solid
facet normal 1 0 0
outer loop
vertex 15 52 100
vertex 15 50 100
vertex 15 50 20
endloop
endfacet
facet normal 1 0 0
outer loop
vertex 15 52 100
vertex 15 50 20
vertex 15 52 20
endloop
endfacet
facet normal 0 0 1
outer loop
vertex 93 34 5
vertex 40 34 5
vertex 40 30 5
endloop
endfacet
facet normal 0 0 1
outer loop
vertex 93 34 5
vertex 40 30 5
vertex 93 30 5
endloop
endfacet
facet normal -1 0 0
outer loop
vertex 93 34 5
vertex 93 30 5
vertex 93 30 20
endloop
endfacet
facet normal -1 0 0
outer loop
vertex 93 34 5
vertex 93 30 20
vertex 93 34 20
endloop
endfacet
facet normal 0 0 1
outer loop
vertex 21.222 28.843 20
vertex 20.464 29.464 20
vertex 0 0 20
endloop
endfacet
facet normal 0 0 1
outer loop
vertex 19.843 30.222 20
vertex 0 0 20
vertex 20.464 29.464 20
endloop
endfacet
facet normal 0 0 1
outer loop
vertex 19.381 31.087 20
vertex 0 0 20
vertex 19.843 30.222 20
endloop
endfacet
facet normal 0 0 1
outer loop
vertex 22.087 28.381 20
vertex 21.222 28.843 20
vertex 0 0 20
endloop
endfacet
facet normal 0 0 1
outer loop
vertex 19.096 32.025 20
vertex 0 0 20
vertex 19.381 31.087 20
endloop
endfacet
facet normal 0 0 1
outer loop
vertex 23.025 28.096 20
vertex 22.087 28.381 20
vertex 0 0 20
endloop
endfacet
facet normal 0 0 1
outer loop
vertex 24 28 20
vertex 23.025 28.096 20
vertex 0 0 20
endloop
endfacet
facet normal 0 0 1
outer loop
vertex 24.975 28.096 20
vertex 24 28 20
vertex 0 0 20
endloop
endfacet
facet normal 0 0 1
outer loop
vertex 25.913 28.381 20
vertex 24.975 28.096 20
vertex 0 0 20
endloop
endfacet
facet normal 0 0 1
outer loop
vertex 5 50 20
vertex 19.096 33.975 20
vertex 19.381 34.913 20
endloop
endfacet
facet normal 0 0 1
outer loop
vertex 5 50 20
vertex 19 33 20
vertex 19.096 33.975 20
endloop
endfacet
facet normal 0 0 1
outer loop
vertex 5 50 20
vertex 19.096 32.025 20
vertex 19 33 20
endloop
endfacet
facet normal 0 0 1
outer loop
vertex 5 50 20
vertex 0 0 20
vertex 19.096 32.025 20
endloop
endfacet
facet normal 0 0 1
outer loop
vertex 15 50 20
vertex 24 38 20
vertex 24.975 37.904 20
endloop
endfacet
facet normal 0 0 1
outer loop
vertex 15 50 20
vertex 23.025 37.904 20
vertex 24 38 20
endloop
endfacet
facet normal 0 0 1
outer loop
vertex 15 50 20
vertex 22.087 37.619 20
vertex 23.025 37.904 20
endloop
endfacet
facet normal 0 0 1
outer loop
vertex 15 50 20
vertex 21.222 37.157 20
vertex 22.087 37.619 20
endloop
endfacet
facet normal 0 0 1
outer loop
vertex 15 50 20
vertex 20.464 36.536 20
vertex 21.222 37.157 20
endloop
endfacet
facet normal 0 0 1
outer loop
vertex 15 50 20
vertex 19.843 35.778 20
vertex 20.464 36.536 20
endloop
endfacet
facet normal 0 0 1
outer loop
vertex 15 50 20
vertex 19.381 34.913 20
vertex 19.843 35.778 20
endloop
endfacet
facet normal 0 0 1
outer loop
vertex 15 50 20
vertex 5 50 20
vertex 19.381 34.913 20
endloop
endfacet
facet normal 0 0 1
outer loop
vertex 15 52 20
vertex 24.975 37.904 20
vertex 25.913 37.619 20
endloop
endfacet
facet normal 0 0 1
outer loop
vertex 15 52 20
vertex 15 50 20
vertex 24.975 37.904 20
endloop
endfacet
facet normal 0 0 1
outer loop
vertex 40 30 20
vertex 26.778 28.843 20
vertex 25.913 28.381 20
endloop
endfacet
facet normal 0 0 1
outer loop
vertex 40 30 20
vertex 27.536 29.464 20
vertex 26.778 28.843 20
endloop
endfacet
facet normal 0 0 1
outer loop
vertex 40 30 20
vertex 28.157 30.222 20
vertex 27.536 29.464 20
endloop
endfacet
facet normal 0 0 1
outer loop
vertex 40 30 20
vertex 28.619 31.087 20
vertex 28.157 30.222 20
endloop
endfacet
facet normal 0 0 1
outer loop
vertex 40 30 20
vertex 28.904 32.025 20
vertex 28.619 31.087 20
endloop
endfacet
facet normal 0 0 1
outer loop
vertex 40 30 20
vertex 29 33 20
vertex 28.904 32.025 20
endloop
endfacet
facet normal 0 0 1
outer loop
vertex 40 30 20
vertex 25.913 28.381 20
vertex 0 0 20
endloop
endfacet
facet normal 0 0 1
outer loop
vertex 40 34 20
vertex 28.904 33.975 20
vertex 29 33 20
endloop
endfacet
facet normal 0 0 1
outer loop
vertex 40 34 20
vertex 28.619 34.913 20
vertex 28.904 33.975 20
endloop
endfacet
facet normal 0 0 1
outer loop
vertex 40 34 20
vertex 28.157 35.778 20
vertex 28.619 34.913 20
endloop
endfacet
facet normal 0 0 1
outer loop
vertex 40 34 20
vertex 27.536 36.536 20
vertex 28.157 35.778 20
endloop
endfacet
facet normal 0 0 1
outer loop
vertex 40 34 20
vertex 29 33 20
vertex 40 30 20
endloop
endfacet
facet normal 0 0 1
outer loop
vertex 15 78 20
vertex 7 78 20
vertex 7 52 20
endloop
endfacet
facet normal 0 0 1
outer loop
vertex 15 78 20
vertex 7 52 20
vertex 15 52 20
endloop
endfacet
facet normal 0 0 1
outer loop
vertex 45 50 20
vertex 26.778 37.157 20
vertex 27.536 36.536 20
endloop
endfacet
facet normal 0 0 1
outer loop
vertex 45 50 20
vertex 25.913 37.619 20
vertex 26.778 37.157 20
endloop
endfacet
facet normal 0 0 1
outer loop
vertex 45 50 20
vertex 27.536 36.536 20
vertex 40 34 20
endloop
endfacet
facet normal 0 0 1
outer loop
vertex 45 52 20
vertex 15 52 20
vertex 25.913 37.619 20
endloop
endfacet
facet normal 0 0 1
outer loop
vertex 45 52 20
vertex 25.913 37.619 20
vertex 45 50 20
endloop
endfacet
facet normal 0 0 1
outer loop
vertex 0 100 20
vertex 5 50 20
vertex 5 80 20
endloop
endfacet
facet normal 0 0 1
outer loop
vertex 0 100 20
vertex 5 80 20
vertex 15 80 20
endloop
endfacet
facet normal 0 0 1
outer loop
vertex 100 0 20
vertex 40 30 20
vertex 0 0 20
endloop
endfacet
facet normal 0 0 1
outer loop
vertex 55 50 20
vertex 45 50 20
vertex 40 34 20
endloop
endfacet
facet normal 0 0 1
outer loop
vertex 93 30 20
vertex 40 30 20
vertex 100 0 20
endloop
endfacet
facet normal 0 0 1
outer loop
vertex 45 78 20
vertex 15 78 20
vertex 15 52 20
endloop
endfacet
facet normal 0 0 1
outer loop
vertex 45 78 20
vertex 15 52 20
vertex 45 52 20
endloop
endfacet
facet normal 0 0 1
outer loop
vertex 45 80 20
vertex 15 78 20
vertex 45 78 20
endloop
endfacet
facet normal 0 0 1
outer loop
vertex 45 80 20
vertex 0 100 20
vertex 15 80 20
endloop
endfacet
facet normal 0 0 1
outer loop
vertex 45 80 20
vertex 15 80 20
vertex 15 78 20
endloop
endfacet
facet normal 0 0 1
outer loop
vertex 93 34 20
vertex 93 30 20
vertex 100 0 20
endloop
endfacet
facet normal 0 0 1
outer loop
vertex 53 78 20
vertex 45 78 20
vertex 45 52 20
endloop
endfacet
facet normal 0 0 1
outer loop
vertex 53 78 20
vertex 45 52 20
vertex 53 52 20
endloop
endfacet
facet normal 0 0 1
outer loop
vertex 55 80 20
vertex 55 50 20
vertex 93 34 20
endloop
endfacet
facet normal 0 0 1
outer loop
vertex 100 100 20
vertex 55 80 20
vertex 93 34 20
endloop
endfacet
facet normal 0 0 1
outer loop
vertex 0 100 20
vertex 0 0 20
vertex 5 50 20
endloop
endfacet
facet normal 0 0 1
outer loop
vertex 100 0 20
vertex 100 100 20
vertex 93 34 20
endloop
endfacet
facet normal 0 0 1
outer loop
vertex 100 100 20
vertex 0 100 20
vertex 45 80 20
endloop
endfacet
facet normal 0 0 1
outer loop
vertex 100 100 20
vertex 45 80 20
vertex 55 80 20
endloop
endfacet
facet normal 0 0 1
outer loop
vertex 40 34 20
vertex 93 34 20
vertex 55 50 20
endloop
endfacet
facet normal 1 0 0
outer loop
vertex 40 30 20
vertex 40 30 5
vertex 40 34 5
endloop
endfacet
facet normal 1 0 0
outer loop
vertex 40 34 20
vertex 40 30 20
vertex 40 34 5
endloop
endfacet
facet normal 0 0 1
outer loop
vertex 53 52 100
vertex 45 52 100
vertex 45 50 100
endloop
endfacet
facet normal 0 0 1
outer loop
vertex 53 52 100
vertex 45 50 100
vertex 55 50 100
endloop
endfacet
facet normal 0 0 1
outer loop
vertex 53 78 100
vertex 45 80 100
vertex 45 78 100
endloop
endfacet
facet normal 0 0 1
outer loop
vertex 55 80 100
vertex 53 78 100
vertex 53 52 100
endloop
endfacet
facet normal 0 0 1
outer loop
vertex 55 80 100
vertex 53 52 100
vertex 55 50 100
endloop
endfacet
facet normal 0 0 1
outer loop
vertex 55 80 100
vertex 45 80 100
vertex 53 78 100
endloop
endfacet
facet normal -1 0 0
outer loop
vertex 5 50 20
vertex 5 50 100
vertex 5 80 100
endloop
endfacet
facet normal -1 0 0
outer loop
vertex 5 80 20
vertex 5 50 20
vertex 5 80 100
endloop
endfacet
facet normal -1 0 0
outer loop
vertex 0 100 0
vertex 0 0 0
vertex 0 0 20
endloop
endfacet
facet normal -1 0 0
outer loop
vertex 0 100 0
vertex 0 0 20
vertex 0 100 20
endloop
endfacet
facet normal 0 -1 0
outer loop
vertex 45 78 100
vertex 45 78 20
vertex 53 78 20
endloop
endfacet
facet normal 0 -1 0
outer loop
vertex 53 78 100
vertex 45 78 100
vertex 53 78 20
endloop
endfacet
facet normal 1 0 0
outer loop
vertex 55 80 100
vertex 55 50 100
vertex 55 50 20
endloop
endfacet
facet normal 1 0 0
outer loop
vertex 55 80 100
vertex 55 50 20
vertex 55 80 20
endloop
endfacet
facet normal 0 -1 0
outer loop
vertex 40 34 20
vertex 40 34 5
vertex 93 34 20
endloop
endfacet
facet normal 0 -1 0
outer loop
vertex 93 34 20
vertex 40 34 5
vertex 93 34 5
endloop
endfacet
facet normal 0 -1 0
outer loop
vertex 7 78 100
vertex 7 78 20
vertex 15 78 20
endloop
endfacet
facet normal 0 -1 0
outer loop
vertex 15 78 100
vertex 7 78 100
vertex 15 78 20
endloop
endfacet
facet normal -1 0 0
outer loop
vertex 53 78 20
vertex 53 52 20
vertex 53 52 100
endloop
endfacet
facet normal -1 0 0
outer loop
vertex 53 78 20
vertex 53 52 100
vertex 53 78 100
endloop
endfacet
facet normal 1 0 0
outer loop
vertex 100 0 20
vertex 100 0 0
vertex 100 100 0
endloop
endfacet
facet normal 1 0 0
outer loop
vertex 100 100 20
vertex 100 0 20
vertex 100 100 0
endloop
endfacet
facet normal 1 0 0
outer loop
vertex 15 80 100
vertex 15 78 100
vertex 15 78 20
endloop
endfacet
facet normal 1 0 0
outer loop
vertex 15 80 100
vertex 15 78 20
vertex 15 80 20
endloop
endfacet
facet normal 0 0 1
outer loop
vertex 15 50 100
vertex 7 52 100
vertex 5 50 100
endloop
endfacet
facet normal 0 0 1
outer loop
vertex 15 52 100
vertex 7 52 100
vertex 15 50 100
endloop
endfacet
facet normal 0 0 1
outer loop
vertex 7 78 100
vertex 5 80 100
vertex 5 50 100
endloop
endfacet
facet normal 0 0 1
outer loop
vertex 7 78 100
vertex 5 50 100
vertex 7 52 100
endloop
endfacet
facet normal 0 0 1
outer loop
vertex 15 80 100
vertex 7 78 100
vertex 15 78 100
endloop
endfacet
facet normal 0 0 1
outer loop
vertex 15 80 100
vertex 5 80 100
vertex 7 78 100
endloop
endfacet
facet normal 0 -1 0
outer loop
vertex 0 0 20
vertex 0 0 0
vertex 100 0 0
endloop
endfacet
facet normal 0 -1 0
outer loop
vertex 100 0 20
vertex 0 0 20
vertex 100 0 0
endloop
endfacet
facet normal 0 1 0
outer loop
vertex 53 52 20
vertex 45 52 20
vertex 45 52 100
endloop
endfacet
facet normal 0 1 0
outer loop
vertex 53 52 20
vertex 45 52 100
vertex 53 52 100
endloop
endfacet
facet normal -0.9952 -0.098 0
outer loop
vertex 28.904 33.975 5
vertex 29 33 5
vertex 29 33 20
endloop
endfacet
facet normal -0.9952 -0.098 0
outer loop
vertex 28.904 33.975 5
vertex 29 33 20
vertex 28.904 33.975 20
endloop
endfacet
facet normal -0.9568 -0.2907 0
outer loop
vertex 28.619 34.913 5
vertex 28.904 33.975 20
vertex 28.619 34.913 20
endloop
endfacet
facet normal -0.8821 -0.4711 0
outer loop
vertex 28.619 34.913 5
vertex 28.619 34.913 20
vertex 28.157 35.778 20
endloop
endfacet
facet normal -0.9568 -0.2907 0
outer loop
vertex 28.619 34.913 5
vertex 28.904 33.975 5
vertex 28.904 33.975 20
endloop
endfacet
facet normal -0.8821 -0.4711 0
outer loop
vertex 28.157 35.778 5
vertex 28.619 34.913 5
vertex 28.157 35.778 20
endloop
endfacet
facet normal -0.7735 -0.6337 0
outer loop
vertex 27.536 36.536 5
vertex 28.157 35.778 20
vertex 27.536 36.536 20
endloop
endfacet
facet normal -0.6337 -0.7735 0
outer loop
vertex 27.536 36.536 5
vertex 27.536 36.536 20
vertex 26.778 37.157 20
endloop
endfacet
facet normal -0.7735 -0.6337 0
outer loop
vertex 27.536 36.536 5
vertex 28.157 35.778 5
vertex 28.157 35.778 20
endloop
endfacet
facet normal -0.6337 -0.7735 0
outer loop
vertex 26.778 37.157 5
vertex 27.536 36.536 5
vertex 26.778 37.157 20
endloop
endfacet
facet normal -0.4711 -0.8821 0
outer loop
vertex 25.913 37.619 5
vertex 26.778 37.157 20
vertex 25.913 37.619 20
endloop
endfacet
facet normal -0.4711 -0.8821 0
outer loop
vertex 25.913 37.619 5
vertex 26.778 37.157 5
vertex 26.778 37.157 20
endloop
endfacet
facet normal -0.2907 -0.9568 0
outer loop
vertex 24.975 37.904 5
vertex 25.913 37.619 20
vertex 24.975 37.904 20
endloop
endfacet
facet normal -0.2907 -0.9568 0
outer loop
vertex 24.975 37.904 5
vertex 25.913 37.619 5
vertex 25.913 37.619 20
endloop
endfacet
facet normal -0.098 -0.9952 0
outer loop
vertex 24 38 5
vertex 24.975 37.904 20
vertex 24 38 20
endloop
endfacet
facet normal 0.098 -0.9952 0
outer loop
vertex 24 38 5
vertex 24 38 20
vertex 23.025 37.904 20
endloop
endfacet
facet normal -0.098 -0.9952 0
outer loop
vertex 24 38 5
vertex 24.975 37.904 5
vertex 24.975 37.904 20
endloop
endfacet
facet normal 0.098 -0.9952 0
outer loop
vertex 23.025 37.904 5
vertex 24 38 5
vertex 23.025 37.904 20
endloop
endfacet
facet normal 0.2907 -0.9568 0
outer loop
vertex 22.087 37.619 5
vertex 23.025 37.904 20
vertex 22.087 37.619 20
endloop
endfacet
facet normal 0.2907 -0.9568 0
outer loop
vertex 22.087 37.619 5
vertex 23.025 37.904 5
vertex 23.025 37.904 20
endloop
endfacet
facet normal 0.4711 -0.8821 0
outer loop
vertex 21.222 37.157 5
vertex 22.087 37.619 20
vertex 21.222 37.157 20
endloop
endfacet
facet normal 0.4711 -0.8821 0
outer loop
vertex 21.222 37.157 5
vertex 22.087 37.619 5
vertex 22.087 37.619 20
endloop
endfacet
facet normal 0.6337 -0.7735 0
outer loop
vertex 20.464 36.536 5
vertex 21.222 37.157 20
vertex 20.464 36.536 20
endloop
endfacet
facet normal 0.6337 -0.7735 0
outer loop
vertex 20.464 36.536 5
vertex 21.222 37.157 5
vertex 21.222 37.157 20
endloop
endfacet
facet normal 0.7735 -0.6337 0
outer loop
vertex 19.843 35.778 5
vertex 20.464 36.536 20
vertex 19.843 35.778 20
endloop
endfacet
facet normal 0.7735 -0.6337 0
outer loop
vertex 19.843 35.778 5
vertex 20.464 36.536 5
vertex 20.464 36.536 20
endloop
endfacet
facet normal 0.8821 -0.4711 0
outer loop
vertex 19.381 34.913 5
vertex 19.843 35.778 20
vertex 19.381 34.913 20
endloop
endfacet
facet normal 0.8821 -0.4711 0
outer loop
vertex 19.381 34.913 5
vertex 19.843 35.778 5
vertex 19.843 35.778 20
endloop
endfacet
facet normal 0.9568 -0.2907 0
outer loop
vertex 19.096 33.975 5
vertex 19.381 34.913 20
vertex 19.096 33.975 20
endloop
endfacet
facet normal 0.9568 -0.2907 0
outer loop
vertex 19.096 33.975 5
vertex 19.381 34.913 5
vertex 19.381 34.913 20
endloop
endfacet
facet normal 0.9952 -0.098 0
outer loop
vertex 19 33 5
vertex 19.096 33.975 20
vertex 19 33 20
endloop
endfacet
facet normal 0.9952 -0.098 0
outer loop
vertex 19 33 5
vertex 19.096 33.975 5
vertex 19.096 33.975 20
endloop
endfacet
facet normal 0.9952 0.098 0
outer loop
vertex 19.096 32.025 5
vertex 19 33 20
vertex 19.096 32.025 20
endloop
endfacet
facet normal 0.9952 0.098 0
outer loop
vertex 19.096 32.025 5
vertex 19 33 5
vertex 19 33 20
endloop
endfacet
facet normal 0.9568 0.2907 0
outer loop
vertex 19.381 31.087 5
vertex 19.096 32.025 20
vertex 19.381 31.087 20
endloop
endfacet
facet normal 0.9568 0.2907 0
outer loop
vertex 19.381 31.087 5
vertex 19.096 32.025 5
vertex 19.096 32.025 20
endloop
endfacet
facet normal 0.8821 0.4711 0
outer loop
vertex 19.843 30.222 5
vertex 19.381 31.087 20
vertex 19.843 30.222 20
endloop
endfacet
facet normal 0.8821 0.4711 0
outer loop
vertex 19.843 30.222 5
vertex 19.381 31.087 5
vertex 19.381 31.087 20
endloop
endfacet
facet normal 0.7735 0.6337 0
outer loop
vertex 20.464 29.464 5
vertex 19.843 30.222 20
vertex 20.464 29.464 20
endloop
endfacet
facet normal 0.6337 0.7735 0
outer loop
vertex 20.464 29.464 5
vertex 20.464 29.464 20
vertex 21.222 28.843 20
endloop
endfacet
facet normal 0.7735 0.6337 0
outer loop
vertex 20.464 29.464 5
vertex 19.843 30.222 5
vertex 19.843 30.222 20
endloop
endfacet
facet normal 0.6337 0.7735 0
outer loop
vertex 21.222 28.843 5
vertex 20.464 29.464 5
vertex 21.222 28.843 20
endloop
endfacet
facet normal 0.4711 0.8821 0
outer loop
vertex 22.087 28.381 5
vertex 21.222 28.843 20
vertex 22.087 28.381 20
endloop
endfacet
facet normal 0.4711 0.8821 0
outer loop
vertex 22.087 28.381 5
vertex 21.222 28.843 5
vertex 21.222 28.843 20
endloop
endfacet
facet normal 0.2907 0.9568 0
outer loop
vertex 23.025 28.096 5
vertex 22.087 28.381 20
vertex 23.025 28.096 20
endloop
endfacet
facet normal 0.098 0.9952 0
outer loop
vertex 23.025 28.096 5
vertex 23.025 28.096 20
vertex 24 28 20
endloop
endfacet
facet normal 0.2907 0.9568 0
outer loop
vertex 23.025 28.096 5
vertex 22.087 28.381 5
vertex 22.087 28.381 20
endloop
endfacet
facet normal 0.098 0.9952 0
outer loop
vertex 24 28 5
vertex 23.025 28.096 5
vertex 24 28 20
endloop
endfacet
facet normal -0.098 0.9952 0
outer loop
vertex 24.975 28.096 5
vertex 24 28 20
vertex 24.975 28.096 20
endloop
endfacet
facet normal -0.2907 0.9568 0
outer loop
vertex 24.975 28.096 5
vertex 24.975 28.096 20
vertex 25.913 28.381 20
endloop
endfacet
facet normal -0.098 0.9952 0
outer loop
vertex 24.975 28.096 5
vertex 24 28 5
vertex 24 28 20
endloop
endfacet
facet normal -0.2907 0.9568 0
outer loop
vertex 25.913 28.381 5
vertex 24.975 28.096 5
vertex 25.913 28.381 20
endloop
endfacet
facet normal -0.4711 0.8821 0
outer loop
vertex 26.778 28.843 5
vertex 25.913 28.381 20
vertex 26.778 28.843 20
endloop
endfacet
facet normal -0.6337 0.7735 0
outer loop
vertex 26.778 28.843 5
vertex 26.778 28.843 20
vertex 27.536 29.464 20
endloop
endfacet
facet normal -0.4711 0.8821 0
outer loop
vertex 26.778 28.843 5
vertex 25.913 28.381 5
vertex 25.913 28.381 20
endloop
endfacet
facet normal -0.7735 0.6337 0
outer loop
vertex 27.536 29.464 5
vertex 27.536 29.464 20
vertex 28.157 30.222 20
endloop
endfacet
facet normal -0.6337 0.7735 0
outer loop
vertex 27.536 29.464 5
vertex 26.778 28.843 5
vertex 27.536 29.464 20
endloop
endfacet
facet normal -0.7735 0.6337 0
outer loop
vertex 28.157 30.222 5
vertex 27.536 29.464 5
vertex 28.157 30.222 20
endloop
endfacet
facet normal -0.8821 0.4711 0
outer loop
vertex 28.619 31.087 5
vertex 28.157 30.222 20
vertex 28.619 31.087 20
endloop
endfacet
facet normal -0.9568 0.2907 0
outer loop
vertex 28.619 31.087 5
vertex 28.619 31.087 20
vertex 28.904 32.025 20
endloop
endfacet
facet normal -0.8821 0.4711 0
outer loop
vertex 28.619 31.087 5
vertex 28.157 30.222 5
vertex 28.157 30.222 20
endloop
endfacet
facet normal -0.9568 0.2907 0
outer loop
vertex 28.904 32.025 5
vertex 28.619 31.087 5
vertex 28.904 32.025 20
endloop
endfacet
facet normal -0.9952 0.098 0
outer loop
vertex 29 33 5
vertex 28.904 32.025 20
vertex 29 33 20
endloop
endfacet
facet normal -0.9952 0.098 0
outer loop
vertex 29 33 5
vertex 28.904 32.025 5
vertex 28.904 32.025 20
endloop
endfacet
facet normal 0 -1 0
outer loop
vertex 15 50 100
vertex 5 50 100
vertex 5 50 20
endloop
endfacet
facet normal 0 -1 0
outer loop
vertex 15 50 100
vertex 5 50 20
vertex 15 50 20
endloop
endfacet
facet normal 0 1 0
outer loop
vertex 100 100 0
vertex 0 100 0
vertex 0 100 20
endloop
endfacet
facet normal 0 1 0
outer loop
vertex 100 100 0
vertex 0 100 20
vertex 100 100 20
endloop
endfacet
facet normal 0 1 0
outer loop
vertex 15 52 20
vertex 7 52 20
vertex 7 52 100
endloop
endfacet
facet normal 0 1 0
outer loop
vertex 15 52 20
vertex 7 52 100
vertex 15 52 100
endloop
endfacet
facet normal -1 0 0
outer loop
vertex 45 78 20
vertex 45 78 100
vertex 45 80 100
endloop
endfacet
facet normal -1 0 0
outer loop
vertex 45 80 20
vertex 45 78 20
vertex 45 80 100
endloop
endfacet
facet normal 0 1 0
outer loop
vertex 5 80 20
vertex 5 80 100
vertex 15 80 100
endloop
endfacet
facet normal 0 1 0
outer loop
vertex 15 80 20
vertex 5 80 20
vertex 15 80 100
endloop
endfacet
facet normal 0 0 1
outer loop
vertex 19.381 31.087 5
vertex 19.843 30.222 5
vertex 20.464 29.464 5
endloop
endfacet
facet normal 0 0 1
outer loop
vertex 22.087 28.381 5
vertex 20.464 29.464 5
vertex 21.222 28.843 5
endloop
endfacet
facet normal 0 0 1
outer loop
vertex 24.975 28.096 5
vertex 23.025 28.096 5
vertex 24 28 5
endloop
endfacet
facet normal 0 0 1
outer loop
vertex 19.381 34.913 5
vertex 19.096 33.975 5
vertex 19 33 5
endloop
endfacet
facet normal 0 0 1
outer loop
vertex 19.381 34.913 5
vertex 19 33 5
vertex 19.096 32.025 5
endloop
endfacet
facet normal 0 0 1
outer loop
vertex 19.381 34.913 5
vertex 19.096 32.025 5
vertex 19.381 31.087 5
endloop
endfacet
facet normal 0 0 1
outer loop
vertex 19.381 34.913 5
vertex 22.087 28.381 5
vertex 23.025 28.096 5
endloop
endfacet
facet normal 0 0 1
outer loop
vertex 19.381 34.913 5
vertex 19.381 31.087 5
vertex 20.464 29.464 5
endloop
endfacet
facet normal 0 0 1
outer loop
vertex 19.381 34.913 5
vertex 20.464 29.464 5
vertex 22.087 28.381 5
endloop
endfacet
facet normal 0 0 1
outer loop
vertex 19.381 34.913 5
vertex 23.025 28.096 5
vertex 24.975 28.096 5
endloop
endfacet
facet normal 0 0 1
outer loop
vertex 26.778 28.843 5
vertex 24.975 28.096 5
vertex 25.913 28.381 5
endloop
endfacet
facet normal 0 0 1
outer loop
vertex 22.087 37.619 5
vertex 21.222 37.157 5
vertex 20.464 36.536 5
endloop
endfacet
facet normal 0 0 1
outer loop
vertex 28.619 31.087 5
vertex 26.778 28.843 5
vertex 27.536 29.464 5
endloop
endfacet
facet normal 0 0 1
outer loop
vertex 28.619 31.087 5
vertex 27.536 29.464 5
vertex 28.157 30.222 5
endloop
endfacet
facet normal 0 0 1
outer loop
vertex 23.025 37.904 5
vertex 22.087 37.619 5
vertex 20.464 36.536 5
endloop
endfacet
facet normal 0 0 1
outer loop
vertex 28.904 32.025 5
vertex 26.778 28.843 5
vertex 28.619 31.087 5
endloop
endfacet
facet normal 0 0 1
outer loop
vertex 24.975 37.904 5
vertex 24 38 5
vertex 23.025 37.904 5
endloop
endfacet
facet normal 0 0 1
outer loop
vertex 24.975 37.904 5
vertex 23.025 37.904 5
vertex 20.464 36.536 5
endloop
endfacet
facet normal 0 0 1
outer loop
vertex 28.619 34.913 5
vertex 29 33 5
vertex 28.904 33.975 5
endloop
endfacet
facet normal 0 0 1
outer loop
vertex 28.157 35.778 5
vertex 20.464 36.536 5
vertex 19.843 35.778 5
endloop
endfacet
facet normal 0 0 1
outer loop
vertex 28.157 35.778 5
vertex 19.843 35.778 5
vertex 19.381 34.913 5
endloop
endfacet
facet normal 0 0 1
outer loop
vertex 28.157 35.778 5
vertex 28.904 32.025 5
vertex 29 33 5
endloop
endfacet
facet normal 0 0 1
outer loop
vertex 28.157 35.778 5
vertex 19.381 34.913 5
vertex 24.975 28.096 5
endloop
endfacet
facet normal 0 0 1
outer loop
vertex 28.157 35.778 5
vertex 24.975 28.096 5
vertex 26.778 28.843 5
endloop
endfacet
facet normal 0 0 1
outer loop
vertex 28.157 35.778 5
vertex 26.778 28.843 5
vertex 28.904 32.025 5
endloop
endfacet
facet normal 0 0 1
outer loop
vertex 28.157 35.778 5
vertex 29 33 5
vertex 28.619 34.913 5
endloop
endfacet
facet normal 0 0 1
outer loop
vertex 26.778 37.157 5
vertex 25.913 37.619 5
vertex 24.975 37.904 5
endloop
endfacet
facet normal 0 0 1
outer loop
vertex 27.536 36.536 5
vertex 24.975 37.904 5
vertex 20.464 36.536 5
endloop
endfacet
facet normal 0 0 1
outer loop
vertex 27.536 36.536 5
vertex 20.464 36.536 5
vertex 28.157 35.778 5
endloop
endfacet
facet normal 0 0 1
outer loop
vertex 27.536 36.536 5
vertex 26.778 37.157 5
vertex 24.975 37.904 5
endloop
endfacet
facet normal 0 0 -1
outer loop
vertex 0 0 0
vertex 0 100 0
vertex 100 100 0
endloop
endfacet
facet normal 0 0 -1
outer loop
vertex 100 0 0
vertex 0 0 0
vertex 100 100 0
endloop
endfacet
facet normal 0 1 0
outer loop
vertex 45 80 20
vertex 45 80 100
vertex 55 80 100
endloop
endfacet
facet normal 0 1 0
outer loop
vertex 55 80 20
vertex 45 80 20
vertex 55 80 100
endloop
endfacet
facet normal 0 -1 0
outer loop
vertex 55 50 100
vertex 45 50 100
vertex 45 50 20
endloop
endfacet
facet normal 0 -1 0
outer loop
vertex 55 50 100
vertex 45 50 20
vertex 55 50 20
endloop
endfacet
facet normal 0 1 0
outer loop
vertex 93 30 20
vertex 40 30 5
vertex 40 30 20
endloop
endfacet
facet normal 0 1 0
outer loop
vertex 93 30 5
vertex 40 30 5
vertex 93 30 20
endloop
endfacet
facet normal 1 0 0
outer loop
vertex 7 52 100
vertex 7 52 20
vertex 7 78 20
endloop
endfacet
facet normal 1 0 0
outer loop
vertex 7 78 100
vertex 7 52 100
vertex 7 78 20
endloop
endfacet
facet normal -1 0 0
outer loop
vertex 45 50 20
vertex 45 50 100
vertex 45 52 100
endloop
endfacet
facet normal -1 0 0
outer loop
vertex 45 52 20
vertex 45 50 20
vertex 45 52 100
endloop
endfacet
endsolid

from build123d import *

# Parameters (mm, degrees)
BOX_W          = 100
BOX_H          = 100
BOX_DEPTH      = 20
CYLINDER_R     = 5
CYLINDER_DEPTH = 15
BOX001_W       = 50
BOX001_H       = 30
BOX001_DEPTH   = 80
BOX002_W       = 46
BOX002_H       = 26
BOX002_DEPTH   = 80
BOX003_W       = 30
BOX003_H       = 30
BOX003_DEPTH   = 80
BOX004_W       = 53
BOX004_H       = 4
BOX004_DEPTH   = 15


with BuildPart() as part:
    # Box → Box (join)
    with BuildSketch(Plane.XY):
        with Locations((50, 50)):
            Rectangle(BOX_W, BOX_H)
    extrude(amount=BOX_DEPTH)

    # Cylinder → Cylinder (cut)
    with BuildSketch(Plane(origin=(24, 33, 5), x_dir=(1, 0, 0), z_dir=(0, 0, 1))):
        Circle(CYLINDER_R)
    extrude(amount=CYLINDER_DEPTH, mode=Mode.SUBTRACT)

    # Box001 → Box001 (join)
    with BuildSketch(Plane(origin=(5, 50, 20), x_dir=(1, 0, 0), z_dir=(0, 0, 1))):
        with Locations((25, 15)):
            Rectangle(BOX001_W, BOX001_H)
    extrude(amount=BOX001_DEPTH)

    # Box002 → Box002 (cut)
    with BuildSketch(Plane(origin=(7, 52, 20), x_dir=(1, 0, 0), z_dir=(0, 0, 1))):
        with Locations((23, 13)):
            Rectangle(BOX002_W, BOX002_H)
    extrude(amount=BOX002_DEPTH, mode=Mode.SUBTRACT)

    # Box003 → Box003 (cut)
    with BuildSketch(Plane(origin=(15, 50, 20), x_dir=(1, 0, 0), z_dir=(0, 0, 1))):
        with Locations((15, 15)):
            Rectangle(BOX003_W, BOX003_H)
    extrude(amount=BOX003_DEPTH, mode=Mode.SUBTRACT)

    # Box004 → Box004 (cut)
    with BuildSketch(Plane(origin=(40, 30, 5), x_dir=(1, 0, 0), z_dir=(0, 0, 1))):
        with Locations((26.5, 2)):
            Rectangle(BOX004_W, BOX004_H)
    extrude(amount=BOX004_DEPTH, mode=Mode.SUBTRACT)


solid = part.part
